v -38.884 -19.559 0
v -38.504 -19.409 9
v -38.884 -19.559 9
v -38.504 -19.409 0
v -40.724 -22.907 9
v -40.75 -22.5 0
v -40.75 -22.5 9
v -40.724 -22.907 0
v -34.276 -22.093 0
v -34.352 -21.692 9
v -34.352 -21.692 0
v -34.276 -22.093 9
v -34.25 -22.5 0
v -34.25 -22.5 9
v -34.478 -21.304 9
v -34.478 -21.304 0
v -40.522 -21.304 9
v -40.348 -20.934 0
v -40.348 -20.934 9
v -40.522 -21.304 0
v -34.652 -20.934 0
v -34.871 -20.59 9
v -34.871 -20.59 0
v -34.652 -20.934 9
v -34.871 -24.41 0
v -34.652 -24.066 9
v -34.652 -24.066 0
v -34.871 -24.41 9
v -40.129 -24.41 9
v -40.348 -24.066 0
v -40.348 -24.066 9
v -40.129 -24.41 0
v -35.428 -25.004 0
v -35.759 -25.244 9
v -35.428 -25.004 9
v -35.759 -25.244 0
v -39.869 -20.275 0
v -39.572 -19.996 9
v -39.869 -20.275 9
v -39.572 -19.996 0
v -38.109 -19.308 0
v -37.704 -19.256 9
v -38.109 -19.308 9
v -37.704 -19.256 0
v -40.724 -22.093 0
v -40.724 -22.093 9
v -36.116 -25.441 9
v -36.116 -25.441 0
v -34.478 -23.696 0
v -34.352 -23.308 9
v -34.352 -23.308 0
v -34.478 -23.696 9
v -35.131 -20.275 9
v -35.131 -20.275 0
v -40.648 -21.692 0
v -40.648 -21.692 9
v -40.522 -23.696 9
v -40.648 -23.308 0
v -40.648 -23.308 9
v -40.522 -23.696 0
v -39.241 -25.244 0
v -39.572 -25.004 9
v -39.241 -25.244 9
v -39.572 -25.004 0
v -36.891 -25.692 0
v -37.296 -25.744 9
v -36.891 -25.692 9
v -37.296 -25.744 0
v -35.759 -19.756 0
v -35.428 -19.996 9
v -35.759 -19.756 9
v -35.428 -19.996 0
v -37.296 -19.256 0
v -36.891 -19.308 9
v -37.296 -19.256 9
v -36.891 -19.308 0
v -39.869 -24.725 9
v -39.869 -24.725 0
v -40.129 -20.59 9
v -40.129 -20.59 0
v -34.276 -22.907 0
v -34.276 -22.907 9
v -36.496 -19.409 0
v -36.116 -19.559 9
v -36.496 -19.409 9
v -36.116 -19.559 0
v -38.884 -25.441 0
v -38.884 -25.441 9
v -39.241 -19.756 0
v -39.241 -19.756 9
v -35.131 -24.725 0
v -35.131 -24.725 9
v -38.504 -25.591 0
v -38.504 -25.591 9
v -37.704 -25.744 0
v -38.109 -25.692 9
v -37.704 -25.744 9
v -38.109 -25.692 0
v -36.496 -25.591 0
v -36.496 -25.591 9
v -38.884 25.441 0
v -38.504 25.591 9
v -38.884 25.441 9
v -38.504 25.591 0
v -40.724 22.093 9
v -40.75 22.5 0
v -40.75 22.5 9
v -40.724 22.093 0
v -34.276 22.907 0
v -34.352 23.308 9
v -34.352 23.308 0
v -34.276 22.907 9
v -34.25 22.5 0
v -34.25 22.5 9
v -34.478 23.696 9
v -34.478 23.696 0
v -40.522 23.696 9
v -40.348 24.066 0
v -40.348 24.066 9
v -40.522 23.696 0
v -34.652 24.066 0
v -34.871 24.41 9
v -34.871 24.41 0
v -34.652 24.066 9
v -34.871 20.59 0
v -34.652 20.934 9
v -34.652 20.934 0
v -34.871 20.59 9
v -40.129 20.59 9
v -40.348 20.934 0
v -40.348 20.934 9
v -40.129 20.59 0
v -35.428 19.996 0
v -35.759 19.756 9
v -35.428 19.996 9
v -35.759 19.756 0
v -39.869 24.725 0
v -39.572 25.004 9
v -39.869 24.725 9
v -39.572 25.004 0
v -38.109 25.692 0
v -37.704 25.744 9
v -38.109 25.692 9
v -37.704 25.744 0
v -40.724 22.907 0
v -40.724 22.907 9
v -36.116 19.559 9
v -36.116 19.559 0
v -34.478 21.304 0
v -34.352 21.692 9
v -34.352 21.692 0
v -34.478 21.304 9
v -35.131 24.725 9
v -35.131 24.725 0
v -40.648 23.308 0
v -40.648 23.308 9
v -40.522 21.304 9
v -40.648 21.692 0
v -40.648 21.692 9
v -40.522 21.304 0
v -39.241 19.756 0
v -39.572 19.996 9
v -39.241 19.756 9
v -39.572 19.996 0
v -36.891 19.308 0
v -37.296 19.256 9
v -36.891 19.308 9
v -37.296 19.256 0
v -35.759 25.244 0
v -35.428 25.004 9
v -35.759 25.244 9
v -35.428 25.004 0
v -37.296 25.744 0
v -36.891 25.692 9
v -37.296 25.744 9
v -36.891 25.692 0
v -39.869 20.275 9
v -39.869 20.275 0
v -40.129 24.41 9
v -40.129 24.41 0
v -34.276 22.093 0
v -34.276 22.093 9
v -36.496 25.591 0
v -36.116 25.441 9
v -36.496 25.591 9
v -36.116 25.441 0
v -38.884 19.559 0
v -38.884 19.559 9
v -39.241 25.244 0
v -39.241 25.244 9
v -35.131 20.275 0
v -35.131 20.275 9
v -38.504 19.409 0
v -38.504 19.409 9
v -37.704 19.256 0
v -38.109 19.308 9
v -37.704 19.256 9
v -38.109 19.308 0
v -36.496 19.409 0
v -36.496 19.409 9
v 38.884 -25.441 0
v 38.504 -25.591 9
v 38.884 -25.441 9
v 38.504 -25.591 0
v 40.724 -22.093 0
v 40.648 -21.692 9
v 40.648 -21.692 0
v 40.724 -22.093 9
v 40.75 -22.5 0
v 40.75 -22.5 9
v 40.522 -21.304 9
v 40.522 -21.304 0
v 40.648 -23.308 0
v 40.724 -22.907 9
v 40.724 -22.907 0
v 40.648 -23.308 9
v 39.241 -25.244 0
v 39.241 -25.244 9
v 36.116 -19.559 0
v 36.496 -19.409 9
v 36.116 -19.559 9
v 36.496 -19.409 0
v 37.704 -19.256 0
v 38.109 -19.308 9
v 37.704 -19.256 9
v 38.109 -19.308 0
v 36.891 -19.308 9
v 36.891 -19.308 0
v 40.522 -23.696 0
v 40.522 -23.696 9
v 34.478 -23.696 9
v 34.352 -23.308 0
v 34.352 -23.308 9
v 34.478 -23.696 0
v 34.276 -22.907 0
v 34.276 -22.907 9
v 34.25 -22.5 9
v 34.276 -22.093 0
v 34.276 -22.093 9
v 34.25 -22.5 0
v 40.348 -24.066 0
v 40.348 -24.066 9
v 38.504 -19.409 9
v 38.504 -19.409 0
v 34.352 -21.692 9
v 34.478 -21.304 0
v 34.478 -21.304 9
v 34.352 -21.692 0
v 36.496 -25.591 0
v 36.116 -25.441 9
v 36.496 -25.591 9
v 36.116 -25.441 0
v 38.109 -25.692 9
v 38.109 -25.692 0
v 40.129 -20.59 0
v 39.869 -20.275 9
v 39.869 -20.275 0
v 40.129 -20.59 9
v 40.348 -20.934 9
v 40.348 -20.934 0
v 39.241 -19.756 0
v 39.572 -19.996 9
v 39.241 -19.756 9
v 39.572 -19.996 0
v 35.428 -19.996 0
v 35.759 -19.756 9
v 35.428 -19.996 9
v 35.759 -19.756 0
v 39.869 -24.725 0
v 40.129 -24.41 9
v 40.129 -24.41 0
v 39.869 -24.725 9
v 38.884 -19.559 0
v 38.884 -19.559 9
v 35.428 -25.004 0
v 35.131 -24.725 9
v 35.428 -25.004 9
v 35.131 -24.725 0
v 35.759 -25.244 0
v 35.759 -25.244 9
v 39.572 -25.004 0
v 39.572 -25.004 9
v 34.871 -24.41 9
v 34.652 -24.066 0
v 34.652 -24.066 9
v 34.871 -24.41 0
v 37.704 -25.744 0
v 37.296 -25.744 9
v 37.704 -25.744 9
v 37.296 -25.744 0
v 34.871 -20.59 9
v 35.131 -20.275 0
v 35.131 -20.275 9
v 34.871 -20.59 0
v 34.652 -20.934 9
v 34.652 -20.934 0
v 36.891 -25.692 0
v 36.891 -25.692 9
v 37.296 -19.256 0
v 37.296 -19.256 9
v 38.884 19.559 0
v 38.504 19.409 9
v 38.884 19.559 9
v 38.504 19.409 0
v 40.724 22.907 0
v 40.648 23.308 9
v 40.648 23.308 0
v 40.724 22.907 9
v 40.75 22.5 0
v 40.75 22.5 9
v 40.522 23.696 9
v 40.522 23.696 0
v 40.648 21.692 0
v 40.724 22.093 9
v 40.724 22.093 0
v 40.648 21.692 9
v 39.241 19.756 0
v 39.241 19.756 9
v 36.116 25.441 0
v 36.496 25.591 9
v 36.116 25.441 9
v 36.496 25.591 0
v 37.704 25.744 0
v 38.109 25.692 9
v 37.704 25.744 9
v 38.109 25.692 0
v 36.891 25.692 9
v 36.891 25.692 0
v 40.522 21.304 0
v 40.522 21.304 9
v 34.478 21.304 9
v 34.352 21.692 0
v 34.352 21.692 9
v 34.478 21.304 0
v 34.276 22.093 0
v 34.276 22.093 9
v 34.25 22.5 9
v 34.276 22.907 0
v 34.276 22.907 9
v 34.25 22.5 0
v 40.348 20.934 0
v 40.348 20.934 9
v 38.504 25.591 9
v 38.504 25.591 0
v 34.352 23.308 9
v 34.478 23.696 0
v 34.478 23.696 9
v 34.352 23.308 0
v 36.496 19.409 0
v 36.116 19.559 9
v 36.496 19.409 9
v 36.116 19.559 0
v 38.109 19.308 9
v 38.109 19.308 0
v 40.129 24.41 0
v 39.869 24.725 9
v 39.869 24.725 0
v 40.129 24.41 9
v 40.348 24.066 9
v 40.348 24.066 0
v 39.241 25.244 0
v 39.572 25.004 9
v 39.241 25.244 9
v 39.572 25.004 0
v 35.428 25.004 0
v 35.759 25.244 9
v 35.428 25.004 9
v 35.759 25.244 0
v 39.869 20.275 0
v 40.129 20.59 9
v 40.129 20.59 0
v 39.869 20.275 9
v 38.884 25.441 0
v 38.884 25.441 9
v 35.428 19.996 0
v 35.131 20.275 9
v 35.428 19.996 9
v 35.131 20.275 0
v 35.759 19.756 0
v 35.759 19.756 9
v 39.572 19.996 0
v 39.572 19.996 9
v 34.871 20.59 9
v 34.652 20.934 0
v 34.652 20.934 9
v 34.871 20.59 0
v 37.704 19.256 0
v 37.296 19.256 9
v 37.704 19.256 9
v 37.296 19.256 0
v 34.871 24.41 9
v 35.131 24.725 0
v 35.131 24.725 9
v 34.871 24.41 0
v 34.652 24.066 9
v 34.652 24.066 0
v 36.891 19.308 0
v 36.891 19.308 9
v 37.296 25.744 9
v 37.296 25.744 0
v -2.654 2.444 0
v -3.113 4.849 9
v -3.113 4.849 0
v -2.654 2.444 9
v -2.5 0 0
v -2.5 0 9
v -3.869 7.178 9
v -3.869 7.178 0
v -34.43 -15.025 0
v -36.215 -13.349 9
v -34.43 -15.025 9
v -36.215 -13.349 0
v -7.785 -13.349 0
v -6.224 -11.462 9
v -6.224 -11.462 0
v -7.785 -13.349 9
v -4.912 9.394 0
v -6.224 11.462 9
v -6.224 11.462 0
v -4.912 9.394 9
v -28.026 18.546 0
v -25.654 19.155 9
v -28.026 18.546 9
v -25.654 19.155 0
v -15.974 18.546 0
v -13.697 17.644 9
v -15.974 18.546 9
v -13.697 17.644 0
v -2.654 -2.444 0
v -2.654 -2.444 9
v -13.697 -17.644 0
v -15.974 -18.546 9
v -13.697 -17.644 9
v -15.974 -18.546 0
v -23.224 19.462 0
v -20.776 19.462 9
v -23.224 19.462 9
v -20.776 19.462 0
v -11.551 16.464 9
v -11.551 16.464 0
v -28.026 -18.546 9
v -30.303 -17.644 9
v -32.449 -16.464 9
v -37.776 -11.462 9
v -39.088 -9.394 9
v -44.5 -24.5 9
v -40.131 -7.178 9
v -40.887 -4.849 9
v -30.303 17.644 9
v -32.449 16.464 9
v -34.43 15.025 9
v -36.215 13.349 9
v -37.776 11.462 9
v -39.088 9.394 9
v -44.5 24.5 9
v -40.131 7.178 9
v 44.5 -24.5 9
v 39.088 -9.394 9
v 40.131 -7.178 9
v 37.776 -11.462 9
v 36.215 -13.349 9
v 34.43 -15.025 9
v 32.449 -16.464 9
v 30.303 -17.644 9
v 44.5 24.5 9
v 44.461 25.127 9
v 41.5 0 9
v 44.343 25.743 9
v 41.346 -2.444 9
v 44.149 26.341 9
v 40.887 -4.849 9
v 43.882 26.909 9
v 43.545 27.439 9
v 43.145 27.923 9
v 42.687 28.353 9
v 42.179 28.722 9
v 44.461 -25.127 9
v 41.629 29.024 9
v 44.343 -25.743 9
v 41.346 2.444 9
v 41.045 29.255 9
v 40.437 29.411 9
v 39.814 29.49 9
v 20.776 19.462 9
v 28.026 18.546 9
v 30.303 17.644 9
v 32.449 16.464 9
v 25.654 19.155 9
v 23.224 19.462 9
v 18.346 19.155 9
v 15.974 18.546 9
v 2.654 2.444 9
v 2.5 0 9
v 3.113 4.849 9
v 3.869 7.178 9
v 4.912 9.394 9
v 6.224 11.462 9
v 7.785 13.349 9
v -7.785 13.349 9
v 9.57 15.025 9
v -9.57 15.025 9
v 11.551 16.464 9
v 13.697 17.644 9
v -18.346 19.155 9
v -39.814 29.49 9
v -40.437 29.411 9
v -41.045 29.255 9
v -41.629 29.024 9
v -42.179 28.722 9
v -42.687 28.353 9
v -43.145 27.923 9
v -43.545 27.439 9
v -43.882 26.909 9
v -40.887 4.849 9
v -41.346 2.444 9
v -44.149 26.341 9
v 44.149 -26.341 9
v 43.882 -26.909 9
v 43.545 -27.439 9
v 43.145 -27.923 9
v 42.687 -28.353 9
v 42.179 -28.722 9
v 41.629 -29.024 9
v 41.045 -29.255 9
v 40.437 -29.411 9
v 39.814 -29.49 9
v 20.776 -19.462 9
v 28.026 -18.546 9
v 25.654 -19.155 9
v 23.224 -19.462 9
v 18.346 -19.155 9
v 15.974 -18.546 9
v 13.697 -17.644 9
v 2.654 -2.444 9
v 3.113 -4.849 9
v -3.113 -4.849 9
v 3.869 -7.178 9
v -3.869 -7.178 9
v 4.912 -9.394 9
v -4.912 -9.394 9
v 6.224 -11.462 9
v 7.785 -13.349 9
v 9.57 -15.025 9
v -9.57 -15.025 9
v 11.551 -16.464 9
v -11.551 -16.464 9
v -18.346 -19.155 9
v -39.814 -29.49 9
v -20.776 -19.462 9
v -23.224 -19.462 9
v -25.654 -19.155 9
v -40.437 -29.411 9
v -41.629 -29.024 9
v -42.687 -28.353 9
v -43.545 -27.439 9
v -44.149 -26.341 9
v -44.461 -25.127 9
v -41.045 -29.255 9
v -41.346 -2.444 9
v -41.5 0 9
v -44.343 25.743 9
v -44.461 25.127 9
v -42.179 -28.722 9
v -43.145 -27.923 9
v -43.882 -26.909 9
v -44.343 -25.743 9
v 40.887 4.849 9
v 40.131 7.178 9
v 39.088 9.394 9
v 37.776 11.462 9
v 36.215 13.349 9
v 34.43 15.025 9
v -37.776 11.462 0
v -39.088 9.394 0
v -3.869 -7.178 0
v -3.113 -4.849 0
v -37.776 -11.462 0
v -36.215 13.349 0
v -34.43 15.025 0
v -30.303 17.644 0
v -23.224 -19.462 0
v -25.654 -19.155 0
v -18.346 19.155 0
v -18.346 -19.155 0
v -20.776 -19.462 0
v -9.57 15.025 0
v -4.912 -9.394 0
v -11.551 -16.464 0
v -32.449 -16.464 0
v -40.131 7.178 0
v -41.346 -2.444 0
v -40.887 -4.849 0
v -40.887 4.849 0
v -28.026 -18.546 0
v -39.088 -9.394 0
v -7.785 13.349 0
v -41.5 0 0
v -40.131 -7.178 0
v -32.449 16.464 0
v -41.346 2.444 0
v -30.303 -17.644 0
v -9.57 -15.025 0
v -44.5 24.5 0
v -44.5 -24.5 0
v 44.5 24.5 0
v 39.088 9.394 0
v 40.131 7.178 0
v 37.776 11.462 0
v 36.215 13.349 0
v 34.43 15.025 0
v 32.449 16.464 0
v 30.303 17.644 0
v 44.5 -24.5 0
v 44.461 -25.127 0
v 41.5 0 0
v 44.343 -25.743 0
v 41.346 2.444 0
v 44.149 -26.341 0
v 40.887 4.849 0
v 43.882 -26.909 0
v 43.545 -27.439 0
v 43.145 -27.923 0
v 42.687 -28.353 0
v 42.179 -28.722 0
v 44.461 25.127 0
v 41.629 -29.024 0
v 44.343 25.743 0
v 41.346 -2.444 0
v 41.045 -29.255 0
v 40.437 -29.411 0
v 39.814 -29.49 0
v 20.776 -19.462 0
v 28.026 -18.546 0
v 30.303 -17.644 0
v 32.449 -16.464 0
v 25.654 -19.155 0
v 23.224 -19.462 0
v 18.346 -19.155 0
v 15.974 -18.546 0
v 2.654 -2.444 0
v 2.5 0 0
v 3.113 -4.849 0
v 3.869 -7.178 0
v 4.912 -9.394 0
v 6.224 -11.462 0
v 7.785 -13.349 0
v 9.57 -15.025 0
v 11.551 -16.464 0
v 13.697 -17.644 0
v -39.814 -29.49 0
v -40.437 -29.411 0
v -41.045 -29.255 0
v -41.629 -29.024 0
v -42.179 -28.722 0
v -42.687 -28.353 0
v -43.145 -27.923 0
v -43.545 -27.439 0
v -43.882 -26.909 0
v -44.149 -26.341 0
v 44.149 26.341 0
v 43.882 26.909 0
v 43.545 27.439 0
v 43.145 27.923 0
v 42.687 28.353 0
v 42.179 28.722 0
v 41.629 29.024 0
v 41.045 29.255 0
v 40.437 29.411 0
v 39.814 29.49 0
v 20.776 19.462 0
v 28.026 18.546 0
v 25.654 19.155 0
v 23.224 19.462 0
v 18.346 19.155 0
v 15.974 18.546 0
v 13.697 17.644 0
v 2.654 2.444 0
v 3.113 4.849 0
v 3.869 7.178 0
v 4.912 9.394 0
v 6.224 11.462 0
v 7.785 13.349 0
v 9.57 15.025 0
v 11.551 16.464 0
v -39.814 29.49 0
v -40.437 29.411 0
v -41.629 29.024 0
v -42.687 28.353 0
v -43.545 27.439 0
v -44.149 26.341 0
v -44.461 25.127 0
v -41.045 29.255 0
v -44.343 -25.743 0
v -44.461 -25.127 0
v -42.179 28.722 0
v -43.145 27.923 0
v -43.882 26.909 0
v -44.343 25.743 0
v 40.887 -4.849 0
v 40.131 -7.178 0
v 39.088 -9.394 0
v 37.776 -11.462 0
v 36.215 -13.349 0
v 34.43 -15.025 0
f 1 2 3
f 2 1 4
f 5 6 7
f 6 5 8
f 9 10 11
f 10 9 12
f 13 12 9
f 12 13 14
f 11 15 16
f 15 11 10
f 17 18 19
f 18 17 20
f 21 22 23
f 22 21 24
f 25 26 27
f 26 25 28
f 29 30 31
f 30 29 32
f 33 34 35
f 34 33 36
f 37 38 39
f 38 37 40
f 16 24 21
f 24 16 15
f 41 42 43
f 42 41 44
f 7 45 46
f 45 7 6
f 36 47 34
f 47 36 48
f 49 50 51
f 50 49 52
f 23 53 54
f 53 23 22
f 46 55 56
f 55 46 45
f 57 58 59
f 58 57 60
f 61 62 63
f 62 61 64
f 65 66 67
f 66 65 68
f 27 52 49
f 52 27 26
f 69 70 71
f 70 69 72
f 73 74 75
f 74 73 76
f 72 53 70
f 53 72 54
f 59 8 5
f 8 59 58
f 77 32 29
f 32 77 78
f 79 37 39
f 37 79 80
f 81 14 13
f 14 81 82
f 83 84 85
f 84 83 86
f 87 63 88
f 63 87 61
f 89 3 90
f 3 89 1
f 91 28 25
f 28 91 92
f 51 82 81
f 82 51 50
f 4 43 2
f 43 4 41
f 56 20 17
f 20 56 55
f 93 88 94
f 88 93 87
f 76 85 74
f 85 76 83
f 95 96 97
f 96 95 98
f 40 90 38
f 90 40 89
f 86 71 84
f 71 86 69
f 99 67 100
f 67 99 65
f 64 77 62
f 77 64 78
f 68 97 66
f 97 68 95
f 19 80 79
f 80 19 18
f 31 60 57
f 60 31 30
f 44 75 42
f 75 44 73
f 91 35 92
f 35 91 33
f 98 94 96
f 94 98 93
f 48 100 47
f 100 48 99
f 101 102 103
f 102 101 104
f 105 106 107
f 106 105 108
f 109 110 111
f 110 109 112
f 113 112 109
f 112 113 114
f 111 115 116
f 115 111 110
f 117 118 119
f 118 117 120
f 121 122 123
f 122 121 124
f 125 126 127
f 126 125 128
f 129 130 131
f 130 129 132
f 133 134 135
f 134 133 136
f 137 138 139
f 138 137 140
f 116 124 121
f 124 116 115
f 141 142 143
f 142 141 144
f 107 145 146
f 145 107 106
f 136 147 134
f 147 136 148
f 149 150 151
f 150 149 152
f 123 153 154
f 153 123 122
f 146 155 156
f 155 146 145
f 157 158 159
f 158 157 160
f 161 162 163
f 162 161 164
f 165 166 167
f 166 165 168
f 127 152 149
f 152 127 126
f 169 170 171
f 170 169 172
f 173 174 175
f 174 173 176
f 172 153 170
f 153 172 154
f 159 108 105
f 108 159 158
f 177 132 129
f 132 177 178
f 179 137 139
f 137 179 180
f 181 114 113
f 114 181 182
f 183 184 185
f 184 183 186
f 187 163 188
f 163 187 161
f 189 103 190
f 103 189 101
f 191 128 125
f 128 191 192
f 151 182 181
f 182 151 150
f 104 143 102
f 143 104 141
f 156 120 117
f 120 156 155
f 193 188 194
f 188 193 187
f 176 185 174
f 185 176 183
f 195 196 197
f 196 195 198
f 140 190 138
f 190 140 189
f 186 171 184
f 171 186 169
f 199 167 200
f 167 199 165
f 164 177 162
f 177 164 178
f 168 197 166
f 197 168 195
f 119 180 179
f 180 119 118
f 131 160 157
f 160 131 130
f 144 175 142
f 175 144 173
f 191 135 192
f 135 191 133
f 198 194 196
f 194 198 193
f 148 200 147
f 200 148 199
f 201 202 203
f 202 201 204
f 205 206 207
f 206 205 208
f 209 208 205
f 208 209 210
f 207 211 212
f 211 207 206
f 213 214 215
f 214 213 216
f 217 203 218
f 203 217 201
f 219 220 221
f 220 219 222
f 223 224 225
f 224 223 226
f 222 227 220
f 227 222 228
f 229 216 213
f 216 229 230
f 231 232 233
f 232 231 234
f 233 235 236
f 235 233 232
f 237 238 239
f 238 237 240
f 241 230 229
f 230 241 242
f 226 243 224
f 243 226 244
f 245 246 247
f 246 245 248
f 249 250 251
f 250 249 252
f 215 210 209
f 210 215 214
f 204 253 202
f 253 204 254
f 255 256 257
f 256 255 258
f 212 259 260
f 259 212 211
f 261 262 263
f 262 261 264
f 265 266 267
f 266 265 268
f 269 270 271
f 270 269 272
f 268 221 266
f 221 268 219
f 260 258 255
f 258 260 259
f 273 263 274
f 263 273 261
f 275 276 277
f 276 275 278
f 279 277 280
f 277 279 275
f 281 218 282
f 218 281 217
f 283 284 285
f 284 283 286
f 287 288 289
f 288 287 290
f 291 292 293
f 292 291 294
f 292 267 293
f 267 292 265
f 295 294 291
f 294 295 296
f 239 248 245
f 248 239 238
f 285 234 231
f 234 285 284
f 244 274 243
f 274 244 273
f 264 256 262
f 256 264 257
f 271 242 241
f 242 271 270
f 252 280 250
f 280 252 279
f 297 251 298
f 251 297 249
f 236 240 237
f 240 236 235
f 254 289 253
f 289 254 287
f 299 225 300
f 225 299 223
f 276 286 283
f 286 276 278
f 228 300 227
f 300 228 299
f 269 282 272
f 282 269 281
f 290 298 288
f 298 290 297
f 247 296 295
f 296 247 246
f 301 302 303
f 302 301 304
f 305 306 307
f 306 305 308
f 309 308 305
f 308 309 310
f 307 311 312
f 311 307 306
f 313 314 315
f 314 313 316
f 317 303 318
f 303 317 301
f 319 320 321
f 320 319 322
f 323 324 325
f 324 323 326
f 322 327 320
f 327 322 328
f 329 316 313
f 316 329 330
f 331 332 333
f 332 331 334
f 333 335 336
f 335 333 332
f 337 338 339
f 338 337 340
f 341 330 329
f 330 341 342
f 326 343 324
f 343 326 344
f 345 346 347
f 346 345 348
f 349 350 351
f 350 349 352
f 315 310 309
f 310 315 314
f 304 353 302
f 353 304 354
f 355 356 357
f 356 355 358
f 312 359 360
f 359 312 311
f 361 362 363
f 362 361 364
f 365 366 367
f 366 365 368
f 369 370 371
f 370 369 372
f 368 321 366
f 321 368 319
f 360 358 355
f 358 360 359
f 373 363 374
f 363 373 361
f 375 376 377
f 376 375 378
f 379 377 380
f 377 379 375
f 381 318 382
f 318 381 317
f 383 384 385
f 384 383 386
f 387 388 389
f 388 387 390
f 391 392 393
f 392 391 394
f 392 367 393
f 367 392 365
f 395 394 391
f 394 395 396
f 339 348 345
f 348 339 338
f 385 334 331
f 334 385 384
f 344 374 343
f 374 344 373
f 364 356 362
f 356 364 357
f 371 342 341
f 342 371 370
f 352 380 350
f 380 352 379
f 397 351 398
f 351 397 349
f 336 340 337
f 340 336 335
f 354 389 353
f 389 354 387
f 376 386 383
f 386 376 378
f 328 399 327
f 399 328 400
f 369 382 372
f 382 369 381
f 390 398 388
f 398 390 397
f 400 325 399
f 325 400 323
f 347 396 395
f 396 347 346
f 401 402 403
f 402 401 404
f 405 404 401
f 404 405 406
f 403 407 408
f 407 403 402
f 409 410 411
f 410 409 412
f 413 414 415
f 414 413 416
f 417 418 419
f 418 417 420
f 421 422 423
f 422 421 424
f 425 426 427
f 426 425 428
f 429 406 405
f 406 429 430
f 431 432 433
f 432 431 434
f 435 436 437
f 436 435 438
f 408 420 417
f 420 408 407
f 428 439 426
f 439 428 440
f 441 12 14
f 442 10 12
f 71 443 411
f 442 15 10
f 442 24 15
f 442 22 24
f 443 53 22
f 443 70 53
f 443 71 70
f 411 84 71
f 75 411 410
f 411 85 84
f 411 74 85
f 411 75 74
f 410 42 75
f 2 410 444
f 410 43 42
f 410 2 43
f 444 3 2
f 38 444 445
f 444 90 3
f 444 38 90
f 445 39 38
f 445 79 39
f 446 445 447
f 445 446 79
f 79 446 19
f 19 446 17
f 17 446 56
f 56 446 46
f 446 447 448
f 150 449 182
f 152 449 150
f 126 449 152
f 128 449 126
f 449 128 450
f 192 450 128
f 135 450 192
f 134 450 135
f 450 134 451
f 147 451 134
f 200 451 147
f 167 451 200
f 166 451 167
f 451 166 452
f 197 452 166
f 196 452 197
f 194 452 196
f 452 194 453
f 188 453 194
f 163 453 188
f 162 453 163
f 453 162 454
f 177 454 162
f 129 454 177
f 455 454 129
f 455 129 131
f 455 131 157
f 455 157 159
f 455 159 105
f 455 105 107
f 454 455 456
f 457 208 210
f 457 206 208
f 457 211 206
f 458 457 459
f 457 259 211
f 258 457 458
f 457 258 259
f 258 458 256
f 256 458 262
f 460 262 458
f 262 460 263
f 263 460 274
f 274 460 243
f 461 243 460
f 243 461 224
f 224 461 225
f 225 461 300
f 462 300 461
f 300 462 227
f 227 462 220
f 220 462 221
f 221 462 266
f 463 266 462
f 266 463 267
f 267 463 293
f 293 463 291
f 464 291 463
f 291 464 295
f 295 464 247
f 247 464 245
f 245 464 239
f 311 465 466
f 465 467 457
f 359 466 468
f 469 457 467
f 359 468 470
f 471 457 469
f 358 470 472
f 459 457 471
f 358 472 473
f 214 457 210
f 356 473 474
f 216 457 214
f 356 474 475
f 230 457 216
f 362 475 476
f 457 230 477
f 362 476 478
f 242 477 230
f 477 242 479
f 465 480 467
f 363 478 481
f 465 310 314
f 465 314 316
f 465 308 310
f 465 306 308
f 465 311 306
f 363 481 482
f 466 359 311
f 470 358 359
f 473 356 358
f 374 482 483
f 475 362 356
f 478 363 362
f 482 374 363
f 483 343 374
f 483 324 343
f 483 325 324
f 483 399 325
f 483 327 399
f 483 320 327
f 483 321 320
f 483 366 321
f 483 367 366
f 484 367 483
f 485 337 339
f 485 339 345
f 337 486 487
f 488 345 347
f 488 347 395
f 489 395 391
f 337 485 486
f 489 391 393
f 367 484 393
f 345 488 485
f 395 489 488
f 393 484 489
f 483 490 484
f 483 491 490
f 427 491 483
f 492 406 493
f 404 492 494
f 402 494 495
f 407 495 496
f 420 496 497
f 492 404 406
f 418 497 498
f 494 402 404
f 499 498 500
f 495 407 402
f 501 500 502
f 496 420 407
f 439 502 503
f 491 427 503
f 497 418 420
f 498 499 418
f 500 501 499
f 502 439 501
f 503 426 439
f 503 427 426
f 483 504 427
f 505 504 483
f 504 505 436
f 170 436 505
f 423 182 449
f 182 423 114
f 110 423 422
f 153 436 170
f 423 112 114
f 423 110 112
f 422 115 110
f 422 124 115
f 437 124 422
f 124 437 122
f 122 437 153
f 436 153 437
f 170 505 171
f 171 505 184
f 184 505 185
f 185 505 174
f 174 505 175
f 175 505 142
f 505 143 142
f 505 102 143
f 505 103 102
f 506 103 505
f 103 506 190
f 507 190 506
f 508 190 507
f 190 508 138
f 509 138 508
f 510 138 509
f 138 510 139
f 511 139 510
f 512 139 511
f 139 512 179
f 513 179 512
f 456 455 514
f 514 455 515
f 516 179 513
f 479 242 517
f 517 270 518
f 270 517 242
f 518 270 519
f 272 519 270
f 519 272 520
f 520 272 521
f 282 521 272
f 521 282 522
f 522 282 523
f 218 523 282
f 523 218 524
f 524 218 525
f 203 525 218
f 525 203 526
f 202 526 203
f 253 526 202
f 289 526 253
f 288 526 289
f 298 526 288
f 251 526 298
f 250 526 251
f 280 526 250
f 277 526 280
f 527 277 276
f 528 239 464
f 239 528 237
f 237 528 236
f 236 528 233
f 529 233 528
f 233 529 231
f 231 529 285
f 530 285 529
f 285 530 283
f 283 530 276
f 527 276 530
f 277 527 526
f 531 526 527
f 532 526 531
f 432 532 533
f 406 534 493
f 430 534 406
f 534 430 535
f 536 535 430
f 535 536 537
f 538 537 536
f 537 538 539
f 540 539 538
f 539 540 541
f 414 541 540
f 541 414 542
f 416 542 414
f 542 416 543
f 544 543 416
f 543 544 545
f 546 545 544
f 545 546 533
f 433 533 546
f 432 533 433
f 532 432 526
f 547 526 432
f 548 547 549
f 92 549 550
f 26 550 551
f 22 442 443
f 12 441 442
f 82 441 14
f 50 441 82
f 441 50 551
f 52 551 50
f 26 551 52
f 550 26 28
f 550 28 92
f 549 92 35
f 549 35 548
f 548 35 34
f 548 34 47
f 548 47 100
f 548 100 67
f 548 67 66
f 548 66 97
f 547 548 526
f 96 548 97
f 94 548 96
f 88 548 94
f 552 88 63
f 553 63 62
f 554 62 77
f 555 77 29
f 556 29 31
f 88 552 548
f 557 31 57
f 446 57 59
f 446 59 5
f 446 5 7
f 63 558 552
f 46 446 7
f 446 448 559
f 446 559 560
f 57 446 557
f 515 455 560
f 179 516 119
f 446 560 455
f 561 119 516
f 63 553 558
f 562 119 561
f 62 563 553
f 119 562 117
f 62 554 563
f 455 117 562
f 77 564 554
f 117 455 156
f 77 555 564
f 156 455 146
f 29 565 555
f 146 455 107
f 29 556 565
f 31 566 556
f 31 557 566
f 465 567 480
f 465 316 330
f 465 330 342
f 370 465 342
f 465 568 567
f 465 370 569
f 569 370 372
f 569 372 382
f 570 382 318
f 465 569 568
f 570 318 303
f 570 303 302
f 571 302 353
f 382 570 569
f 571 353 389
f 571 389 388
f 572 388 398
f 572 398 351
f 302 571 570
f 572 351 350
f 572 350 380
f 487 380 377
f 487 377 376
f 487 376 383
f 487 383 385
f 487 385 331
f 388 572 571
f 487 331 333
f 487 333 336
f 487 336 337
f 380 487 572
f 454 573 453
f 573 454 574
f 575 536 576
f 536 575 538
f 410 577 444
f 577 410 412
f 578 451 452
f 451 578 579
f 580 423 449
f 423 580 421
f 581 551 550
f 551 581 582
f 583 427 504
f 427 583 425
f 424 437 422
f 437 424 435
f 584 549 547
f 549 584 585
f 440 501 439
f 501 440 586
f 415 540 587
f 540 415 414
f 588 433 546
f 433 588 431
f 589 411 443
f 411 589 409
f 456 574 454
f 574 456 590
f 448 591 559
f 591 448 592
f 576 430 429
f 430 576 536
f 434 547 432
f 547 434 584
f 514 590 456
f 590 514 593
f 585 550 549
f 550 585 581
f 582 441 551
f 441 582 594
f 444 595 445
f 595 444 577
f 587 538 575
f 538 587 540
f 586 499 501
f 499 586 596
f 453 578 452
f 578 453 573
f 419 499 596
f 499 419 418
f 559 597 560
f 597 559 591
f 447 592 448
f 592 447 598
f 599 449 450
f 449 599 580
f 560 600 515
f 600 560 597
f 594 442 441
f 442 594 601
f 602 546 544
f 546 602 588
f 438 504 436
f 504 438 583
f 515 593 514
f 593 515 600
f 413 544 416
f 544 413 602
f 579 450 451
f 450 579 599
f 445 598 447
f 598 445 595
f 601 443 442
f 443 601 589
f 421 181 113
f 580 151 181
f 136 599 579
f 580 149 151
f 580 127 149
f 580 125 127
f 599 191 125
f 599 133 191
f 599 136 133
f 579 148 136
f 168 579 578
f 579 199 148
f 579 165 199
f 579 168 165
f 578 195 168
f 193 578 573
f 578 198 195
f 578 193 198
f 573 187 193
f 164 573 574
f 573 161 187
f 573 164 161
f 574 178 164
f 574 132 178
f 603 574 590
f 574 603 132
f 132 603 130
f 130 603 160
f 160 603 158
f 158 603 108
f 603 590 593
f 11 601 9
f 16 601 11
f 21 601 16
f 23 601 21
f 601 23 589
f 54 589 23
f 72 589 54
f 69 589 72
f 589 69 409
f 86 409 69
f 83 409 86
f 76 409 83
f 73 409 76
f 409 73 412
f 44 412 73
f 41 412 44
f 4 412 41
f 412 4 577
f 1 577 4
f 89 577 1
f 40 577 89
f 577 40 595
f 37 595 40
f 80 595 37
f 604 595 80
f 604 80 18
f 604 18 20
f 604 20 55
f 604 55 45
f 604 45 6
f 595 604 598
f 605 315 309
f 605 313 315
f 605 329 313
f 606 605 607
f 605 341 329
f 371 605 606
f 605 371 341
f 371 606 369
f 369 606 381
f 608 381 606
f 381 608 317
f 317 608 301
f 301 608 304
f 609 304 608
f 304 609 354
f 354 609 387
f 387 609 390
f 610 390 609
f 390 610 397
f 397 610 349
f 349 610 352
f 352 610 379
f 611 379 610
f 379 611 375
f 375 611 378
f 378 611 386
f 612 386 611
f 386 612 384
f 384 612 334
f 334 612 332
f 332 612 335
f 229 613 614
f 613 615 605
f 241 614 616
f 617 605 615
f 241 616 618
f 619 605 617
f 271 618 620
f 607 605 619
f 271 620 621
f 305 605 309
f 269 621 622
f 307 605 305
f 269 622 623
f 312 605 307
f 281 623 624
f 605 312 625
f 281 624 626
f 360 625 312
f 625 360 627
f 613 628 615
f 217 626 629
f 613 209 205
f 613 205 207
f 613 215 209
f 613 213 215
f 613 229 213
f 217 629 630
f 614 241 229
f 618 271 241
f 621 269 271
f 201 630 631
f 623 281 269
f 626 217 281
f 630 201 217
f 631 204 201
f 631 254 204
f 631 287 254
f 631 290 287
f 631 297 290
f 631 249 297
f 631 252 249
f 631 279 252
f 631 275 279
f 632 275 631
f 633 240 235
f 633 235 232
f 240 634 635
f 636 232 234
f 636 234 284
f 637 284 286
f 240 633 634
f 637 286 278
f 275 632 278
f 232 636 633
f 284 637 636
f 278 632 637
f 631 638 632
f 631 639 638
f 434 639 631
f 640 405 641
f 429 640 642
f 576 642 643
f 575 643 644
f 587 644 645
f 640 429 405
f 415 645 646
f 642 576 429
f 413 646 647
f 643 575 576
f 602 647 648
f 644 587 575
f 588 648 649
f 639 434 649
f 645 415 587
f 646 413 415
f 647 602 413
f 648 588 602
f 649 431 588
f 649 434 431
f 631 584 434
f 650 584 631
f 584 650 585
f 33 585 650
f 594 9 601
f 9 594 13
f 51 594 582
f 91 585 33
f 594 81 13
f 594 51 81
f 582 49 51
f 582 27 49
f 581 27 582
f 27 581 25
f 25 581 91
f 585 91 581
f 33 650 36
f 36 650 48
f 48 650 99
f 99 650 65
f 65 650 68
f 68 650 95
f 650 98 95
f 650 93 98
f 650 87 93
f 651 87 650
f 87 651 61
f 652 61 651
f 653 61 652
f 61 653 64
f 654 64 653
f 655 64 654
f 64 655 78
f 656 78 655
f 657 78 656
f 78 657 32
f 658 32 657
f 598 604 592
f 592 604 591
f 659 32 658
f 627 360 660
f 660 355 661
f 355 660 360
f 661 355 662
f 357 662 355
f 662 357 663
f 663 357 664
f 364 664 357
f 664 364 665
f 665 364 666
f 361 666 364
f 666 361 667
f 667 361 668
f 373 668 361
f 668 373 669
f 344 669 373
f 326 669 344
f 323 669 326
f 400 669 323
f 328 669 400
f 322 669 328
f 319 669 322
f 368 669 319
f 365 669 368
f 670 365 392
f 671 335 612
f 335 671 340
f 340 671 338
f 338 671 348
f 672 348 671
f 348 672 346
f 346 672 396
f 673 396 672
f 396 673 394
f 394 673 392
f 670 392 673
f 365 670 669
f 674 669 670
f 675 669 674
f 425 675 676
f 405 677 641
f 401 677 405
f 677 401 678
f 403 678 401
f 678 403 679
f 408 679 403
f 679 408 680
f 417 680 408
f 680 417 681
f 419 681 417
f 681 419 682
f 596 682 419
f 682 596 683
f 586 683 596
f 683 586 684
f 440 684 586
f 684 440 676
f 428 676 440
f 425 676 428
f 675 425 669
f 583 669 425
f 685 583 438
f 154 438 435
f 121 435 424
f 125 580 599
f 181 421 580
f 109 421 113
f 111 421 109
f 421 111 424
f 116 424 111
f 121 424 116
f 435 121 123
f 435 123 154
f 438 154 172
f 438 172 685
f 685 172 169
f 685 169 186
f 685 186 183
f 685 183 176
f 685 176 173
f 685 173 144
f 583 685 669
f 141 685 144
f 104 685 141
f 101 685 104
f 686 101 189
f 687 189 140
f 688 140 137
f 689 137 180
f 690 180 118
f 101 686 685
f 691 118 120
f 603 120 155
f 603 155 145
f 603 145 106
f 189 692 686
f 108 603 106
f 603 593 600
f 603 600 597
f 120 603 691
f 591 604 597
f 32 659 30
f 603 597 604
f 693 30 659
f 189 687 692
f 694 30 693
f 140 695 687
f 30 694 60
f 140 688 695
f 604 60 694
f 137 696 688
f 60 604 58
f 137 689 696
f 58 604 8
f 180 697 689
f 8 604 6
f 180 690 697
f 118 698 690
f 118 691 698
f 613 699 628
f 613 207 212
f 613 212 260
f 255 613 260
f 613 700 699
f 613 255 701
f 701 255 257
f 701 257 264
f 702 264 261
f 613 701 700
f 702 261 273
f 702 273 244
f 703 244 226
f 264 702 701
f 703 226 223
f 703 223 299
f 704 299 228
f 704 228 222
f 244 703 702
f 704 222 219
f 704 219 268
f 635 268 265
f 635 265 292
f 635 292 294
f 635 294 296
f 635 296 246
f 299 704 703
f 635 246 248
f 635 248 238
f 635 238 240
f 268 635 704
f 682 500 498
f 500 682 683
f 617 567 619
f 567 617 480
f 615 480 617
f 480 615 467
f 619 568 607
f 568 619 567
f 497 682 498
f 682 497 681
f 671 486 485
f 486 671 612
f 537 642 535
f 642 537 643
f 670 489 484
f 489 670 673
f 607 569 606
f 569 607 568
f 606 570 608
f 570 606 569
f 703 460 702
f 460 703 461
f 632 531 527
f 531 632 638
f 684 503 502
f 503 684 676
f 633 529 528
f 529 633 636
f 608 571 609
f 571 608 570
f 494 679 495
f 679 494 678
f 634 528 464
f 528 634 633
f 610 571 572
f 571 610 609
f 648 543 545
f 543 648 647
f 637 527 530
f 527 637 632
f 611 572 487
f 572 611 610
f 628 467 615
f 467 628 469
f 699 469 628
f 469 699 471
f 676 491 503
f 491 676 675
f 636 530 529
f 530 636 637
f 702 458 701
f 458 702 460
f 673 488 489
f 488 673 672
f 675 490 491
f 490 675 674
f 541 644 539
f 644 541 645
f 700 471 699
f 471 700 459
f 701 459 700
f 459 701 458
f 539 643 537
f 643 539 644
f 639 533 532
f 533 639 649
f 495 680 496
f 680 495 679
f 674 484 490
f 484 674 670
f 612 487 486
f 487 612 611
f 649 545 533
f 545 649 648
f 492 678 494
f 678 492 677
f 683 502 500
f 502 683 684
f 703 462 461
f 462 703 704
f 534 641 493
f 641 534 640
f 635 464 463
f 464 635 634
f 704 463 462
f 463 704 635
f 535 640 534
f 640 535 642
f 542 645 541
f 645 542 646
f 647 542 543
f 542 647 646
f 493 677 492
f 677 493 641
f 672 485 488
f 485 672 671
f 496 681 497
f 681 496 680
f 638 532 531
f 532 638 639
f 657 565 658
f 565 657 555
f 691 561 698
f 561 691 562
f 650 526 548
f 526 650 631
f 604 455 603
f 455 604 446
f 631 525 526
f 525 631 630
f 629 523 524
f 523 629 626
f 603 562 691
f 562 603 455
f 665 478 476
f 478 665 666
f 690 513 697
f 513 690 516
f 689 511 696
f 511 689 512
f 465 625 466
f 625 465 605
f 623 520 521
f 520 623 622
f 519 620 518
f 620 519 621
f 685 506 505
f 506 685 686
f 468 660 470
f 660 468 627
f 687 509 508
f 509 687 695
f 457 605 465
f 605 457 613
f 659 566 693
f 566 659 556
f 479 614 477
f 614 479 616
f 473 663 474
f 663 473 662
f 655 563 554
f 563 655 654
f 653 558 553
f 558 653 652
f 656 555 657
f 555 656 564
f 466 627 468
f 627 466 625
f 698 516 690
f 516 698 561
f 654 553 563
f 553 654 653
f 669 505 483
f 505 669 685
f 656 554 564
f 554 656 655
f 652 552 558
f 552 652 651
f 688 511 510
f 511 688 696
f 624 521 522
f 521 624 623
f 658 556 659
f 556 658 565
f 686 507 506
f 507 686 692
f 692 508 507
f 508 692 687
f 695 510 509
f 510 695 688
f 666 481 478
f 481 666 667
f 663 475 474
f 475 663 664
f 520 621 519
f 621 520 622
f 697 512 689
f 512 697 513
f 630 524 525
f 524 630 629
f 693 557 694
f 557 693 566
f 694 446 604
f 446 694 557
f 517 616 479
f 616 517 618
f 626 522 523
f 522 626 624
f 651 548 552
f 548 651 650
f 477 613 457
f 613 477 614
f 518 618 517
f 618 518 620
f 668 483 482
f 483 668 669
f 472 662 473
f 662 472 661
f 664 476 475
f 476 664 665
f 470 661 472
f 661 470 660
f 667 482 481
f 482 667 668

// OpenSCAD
$fn = 50;

difference() {
	union() {
		hull() {
			translate(v = [-39.5, 24.5, 0]) {
				cylinder(h = 9, r = 5);
			}
			translate(v = [39.5, 24.5, 0]) {
				cylinder(h = 9, r = 5);
			}
			translate(v = [-39.5, -24.5, 0]) {
				cylinder(h = 9, r = 5);
			}
			translate(v = [39.5, -24.5, 0]) {
				cylinder(h = 9, r = 5);
			}
		}
	}
	union() {
		translate(v = [-37.5, -22.5, -100.0]) {
			cylinder(h = 200, r = 3.25);
		}
		translate(v = [-37.5, 22.5, -100.0]) {
			cylinder(h = 200, r = 3.25);
		}
		translate(v = [37.5, -22.5, -100.0]) {
			cylinder(h = 200, r = 3.25);
		}
		translate(v = [37.5, 22.5, -100.0]) {
			cylinder(h = 200, r = 3.25);
		}
		translate(v = [-37.5, -22.5, -100.0]) {
			cylinder(h = 200, r = 1.8);
		}
		translate(v = [-37.5, 22.5, -100.0]) {
			cylinder(h = 200, r = 1.8);
		}
		translate(v = [37.5, -22.5, -100.0]) {
			cylinder(h = 200, r = 1.8);
		}
		translate(v = [37.5, 22.5, -100.0]) {
			cylinder(h = 200, r = 1.8);
		}
		translate(v = [-22.0, 0, 0.0]) {
			cylinder(h = 9, r = 19.5);
		}
		translate(v = [22.0, 0, 0.0]) {
			cylinder(h = 9, r = 19.5);
		}
	}
}
